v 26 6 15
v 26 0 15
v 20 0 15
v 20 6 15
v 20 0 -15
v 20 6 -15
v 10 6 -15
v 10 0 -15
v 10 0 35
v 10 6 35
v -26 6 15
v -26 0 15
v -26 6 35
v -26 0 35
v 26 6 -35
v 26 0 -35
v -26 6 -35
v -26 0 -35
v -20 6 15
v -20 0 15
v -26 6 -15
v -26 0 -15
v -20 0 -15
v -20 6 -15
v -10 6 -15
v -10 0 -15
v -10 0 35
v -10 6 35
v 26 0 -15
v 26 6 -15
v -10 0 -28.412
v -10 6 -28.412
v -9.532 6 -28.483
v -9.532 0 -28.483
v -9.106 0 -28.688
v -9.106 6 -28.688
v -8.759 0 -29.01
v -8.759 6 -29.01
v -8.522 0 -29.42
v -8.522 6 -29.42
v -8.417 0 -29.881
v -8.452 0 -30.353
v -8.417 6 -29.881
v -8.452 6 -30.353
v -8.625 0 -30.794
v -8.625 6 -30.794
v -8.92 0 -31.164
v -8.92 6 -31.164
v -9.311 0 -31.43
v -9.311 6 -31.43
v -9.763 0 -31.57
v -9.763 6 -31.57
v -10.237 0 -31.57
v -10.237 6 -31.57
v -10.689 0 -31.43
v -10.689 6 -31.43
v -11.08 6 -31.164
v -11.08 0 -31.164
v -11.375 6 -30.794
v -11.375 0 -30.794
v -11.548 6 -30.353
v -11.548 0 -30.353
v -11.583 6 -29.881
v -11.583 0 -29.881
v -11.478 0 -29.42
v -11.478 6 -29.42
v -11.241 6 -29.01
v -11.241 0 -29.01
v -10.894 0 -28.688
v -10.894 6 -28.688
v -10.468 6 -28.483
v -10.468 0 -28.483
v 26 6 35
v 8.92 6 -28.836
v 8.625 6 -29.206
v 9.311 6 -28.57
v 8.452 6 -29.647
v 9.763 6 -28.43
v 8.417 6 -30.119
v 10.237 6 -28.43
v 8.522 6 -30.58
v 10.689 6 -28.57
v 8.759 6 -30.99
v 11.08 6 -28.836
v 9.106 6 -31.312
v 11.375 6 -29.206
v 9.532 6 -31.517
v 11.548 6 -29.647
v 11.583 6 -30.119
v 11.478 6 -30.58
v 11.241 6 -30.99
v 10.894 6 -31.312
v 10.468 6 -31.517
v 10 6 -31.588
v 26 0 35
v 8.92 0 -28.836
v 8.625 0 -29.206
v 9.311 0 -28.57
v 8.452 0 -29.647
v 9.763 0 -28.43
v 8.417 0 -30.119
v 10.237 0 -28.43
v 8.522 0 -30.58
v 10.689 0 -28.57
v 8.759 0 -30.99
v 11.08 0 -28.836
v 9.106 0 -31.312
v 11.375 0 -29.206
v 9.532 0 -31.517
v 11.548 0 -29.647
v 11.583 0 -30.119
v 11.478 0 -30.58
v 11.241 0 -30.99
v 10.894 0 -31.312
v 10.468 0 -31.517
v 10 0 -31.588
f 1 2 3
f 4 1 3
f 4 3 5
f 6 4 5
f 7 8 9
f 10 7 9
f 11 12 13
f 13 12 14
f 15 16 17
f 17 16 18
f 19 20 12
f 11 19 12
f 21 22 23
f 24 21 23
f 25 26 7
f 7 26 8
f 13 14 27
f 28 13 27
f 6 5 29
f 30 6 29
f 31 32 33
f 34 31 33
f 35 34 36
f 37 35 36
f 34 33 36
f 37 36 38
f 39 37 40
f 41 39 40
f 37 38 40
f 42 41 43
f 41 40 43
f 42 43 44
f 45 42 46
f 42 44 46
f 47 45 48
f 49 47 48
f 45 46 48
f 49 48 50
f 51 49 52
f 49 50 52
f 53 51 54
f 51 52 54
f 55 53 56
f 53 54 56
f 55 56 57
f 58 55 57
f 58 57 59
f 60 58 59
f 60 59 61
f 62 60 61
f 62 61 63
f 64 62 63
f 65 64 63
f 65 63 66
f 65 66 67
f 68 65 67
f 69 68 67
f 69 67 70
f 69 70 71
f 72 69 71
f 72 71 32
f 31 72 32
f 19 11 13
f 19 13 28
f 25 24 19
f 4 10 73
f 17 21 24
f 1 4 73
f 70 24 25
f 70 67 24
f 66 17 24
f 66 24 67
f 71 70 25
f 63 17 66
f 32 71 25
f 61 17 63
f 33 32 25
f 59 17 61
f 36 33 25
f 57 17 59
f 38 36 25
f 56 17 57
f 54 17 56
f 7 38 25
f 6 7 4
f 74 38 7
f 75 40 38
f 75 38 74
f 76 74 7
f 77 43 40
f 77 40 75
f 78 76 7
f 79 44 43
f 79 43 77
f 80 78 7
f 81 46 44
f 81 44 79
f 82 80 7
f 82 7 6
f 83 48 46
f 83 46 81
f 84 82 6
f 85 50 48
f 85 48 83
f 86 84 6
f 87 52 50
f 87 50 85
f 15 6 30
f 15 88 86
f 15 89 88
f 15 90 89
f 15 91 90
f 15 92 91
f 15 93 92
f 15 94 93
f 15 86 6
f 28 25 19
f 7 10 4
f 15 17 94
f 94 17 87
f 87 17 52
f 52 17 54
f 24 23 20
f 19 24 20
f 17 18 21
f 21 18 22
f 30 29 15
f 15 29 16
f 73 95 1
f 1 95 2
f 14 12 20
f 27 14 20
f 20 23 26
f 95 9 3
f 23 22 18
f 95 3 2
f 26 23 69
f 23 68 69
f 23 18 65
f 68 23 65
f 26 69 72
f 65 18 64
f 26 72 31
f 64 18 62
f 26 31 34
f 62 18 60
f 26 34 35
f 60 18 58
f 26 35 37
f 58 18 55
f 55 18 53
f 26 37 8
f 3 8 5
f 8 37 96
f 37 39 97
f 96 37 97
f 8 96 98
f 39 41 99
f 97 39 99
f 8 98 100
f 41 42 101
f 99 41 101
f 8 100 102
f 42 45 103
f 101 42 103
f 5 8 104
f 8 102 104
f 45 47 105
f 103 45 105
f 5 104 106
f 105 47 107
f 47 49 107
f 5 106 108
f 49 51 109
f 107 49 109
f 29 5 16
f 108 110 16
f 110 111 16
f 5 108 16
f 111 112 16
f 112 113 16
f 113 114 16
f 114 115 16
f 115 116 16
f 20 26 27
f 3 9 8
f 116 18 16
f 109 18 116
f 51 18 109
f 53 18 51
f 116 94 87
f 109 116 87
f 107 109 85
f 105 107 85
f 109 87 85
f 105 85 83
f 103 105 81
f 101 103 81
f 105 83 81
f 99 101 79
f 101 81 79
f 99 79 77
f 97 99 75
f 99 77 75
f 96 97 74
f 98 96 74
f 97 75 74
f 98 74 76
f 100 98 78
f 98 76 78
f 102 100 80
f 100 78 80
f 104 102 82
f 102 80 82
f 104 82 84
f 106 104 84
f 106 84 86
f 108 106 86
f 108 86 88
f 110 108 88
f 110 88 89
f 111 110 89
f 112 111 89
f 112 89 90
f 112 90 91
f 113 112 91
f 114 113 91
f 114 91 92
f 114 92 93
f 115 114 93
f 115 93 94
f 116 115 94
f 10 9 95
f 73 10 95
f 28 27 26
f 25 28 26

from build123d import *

# Parameters (mm, degrees)
BOSS_EXTRUDE1_DEPTH = 6
SKETCH2_R           = 1.5875
CUT_EXTRUDE1_DEPTH  = 45.011362169


with BuildPart() as part:
    # Sketch1 → Boss-Extrude1 (new body)
    with BuildSketch(Plane(origin=(0, 0, 0), x_dir=(1, 0, 0), z_dir=(0, 1, 0))):
        Polygon((-10, -35), (-10, 15), (10, 15), (10, -35), (26, -35), (26, -15), (20, -15), (20, 15), (26, 15), (26, 35), (-26, 35), (-26, 15), (-20, 15), (-20, -15), (-26, -15), (-26, -35), align=None)
    extrude(amount=BOSS_EXTRUDE1_DEPTH)

    # Sketch2 → Cut-Extrude1 (cut, through all)
    with BuildSketch(Plane(origin=(0, 6, 0), x_dir=(1, 0, 0), z_dir=(0, 1, 0))):
        with Locations(Location((-10, 30, 0), (0, 0, 270))):
            Circle(SKETCH2_R)
        with Locations(Location((10, 30, 0), (0, 0, 90))):
            Circle(SKETCH2_R)
    extrude(amount=-CUT_EXTRUDE1_DEPTH, mode=Mode.SUBTRACT)


solid = part.part
